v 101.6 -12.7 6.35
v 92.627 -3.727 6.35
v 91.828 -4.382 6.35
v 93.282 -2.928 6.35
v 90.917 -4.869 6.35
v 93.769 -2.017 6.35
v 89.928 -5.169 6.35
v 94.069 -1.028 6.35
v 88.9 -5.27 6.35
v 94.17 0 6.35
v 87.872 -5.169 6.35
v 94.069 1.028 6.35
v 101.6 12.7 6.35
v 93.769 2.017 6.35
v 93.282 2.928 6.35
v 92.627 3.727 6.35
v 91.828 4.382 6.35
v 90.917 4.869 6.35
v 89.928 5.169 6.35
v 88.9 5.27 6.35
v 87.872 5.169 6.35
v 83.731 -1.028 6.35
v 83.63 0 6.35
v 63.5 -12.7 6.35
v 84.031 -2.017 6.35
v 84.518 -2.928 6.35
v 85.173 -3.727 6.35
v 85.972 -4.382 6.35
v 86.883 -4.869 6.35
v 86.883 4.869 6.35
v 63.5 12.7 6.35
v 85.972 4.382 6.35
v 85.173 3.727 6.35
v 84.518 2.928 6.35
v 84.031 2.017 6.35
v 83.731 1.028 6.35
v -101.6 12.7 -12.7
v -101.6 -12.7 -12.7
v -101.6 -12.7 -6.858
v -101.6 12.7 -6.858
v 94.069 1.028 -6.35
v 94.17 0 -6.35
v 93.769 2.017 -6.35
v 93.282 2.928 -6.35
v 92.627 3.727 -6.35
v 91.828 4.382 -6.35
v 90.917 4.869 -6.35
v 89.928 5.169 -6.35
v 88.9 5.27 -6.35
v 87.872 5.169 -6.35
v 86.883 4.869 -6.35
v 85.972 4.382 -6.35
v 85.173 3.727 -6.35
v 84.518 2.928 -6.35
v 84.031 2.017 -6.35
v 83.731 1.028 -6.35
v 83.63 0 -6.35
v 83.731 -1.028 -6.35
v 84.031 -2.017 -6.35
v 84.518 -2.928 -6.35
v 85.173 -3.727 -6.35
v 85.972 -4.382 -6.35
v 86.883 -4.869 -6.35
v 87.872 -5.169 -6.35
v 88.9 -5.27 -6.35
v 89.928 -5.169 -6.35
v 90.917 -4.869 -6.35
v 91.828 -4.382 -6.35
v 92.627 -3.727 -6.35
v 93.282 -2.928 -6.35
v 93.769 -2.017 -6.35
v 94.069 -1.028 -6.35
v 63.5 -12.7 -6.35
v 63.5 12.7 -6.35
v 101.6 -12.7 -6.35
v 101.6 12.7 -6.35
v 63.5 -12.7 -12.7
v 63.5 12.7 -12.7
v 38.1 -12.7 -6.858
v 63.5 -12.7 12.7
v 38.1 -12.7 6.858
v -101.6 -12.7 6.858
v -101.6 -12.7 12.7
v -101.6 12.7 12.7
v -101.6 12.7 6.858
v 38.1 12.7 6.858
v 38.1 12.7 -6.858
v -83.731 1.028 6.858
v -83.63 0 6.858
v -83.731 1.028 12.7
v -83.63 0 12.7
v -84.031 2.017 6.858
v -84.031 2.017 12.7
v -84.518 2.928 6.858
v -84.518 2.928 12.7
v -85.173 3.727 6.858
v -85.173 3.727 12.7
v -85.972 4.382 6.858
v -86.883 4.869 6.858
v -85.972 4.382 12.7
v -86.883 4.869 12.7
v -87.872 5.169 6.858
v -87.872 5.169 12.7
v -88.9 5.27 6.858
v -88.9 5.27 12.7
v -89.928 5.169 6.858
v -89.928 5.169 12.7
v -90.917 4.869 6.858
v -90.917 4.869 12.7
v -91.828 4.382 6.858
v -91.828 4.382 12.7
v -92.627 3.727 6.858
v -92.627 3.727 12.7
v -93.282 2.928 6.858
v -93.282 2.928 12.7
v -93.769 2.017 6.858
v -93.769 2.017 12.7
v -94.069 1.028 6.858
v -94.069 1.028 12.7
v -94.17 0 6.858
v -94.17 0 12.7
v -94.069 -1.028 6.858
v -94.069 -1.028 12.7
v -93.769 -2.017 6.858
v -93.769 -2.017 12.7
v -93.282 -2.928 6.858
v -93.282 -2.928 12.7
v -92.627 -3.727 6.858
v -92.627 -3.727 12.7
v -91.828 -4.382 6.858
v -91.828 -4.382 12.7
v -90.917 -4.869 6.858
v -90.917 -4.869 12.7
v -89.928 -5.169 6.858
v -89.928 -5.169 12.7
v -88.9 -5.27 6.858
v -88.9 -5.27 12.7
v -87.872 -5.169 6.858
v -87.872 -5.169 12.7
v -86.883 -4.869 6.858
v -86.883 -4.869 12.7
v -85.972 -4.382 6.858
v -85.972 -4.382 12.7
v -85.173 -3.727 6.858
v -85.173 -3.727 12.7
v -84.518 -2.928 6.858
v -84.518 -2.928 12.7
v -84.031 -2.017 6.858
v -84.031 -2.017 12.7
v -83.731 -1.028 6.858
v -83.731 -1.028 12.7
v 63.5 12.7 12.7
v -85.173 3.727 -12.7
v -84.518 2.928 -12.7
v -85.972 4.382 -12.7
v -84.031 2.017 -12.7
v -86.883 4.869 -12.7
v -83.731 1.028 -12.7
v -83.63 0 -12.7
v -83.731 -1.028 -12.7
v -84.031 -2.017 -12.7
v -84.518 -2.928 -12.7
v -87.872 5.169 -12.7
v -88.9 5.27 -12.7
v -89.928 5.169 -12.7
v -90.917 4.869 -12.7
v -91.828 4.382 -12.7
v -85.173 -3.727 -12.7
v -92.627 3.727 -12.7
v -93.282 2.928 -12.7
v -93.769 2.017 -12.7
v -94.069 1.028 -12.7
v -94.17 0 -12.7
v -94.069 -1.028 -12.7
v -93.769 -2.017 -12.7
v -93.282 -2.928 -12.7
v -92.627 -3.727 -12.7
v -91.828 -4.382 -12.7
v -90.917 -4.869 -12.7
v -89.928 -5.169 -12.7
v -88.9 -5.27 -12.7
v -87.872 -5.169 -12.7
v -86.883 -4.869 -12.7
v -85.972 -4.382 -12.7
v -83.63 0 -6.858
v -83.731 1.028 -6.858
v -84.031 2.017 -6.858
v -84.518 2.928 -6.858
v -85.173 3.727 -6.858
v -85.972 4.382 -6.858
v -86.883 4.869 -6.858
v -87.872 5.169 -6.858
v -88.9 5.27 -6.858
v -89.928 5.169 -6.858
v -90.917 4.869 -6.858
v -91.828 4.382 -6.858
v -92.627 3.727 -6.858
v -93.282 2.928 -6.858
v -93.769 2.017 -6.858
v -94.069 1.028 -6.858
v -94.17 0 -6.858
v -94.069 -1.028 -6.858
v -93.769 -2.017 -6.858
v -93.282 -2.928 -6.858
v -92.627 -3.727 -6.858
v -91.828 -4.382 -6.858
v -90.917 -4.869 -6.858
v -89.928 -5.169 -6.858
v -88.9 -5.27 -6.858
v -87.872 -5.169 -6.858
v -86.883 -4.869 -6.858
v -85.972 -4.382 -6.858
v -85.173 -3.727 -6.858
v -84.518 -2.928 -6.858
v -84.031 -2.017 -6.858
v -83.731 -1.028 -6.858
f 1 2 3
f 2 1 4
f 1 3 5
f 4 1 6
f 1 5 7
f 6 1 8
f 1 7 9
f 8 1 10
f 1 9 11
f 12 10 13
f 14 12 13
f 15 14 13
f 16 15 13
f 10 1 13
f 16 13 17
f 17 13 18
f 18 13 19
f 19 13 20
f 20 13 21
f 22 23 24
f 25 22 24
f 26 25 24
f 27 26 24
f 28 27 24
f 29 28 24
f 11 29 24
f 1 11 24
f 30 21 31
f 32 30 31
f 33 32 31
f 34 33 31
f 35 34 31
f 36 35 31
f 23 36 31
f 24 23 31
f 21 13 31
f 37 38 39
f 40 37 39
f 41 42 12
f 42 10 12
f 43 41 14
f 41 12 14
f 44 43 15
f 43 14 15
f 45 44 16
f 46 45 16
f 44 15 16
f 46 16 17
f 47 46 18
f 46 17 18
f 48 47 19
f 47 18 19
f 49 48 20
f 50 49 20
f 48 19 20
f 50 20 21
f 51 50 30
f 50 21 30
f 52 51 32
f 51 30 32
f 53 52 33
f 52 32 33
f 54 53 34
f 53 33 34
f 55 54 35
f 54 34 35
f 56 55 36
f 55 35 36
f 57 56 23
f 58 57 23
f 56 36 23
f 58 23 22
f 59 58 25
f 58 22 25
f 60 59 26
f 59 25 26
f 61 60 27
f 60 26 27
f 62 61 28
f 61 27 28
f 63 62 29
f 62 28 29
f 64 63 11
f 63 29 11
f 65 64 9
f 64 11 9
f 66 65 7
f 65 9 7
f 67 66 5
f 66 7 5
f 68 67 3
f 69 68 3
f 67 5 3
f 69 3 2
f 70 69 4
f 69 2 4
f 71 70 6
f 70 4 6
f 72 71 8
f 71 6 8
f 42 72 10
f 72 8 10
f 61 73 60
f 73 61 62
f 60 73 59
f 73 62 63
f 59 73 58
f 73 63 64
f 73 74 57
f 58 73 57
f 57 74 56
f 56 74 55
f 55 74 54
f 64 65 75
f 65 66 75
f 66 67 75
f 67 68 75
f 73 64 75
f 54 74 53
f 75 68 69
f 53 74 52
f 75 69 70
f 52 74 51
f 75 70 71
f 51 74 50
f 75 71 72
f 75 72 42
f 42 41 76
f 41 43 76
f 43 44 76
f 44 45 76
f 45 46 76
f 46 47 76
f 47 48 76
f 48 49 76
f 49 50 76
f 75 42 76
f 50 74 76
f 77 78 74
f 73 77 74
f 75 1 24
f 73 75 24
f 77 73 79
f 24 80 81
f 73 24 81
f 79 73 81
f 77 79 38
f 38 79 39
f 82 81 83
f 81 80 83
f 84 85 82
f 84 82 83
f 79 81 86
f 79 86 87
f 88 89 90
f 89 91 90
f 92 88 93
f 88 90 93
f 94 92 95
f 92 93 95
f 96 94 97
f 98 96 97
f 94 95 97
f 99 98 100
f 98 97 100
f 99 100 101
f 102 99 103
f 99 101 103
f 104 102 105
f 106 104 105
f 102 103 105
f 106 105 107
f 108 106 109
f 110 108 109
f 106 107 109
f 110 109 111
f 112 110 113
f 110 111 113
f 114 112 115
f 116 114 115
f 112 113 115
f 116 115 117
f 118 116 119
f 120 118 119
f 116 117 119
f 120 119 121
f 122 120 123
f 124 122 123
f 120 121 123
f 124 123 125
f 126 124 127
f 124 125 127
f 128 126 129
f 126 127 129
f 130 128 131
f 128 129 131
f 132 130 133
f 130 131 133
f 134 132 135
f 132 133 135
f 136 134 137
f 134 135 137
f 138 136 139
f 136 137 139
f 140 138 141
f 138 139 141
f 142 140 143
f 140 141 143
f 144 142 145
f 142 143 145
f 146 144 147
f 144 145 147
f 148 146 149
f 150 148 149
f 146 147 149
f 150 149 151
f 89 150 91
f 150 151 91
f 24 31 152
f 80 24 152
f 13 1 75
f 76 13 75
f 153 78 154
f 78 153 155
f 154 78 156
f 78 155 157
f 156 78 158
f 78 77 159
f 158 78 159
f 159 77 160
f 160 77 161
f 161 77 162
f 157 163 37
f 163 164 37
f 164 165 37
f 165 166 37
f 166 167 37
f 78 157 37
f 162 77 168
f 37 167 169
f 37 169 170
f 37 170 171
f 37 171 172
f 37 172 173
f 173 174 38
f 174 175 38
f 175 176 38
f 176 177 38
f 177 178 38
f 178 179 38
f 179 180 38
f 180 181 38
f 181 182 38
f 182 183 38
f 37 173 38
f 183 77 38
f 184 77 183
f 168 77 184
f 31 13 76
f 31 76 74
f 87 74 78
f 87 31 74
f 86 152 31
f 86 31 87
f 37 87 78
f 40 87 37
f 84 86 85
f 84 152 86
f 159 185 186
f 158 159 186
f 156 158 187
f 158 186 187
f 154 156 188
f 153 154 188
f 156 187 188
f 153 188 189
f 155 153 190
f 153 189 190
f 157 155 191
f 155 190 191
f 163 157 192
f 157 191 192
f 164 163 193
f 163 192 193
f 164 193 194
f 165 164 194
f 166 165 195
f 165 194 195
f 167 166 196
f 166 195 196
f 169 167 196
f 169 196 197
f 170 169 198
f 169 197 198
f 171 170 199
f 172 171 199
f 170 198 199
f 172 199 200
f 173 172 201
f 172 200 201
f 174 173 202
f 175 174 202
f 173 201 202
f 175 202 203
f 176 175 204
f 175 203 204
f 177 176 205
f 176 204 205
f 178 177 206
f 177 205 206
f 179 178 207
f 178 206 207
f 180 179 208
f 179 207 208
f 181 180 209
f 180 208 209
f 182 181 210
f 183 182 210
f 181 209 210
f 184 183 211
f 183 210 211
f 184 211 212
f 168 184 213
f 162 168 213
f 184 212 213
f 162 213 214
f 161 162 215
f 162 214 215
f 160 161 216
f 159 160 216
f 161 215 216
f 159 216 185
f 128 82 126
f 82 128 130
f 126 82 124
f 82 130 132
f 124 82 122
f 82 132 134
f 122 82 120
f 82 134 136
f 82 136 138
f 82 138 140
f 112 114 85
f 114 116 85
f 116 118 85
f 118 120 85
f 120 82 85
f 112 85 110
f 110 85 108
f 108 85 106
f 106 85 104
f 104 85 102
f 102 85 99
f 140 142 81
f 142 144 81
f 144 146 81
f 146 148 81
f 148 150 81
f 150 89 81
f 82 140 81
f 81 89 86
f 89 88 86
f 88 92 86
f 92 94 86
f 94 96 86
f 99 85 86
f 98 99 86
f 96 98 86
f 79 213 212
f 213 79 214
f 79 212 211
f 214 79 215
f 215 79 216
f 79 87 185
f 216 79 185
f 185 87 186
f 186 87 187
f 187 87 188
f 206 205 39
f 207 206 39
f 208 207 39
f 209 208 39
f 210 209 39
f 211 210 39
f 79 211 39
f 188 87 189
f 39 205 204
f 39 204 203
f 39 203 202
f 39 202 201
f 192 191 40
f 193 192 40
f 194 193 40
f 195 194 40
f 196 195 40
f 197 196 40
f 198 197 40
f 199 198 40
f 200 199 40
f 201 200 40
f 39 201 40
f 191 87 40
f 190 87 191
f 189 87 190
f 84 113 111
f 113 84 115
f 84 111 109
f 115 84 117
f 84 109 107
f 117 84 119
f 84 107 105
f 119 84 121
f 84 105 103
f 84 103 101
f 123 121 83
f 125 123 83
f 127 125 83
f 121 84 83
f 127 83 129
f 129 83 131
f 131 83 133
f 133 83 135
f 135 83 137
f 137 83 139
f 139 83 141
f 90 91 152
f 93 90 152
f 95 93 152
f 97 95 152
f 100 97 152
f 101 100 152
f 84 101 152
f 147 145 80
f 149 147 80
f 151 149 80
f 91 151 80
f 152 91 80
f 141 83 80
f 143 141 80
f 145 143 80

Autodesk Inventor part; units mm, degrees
ref_plane "YZ Plane" through (0, 0, 0) normal (1, 0, 0) x (0, 1, 0)
ref_plane "XZ Plane" through (0, 0, 0) normal (0, 1, 0) x (-1, 0, 0)
sketch "Sketch1" plane through (0, 0, 0) normal (0, 1, 0) x (-1, 0, 0)
  line L0 (101.6, 12.7) -> (-101.6, 12.7)
  line L1 (-101.6, 12.7) -> (-101.6, -12.7)
  line L2 (-101.6, -12.7) -> (101.6, -12.7)
  line L3 (101.6, -12.7) -> (101.6, 12.7)
  line L4 (101.6, 12.7) -> (-101.6, -12.7) construction
  line L5 (-101.6, 12.7) -> (101.6, -12.7) construction
  point P0 (0, 0)
  dimension "d0" = 203.2
  dimension "d1" = 25.4
extrude "Extrusion1" add sketch "Sketch1" along normal mid plane 25.4
sketch "Sketch3" plane through (0, 12.7, 0) normal (0, 1, 0) x (1, 0, 0)
  line L0 (-101.6, -6.858) -> (38.1, -6.858)
  line L1 (38.1, -6.858) -> (38.1, 6.858)
  line L2 (38.1, 6.858) -> (-101.6, 6.858)
  line L3 (-101.6, 6.858) -> (-101.6, -6.858)
  line L4 (-101.6, -6.858) -> (38.1, 6.858) construction
  line L5 (38.1, -6.858) -> (-101.6, 6.858) construction
  line L6 (-101.6, 12.7) -> (-101.6, -12.7) projected
  point P0 (0, 0)
  point P1 (-31.75, 0)
  dimension "d7" = 0
  dimension "d8" = 13.716
  dimension "d9" = 139.7
extrude "Extrusion2" cut sketch "Sketch3" against normal through all
sketch "Sketch4" plane through (0, 12.7, 0) normal (0, 1, 0) x (1, 0, 0)
  line L0 (101.6, 12.7) -> (-101.6, 12.7) projected
  line L1 (101.6, 12.7) -> (63.5, 12.7)
  line L2 (63.5, 12.7) -> (63.5, 6.35)
  line L3 (63.5, 6.35) -> (101.6, 6.35)
  line L4 (101.6, 6.35) -> (101.6, 12.7)
  line L5 (101.6, 0) -> (38.1, 0) construction
  line L6 (38.1, 6.858) -> (38.1, -6.858) construction
  point P0 (0, 0)
  dimension "d12" = 38.1
  dimension "d13" = 6.35
extrude "Extrusion3" cut sketch "Sketch4" against normal through all
mirror "Mirror1" about plane through (0, 0, 0) normal (0, 0, 1) of "Extrusion3"
sketch "Sketch5" plane through (-101.6, -12.7, 12.7) normal (0, 0, 1) x (1, 0, 0)
  circle A0 centre (12.7, 12.7) radius 5.2705
  circle A1 centre (190.5, 12.7) radius 5.2705
  line L0 (0, 0) -> (0, 25.4) projected
  line L1 (203.2, 25.4) -> (203.2, 0) projected
  point P0 (101.6, 12.7)
  dimension "d16" = 10.541
  dimension "d17" = 12.7
  dimension "d18" = 12.7
extrude "Extrusion4" cut sketch "Sketch5" against normal through all
properties part number "connectingRodV02-4-in"
